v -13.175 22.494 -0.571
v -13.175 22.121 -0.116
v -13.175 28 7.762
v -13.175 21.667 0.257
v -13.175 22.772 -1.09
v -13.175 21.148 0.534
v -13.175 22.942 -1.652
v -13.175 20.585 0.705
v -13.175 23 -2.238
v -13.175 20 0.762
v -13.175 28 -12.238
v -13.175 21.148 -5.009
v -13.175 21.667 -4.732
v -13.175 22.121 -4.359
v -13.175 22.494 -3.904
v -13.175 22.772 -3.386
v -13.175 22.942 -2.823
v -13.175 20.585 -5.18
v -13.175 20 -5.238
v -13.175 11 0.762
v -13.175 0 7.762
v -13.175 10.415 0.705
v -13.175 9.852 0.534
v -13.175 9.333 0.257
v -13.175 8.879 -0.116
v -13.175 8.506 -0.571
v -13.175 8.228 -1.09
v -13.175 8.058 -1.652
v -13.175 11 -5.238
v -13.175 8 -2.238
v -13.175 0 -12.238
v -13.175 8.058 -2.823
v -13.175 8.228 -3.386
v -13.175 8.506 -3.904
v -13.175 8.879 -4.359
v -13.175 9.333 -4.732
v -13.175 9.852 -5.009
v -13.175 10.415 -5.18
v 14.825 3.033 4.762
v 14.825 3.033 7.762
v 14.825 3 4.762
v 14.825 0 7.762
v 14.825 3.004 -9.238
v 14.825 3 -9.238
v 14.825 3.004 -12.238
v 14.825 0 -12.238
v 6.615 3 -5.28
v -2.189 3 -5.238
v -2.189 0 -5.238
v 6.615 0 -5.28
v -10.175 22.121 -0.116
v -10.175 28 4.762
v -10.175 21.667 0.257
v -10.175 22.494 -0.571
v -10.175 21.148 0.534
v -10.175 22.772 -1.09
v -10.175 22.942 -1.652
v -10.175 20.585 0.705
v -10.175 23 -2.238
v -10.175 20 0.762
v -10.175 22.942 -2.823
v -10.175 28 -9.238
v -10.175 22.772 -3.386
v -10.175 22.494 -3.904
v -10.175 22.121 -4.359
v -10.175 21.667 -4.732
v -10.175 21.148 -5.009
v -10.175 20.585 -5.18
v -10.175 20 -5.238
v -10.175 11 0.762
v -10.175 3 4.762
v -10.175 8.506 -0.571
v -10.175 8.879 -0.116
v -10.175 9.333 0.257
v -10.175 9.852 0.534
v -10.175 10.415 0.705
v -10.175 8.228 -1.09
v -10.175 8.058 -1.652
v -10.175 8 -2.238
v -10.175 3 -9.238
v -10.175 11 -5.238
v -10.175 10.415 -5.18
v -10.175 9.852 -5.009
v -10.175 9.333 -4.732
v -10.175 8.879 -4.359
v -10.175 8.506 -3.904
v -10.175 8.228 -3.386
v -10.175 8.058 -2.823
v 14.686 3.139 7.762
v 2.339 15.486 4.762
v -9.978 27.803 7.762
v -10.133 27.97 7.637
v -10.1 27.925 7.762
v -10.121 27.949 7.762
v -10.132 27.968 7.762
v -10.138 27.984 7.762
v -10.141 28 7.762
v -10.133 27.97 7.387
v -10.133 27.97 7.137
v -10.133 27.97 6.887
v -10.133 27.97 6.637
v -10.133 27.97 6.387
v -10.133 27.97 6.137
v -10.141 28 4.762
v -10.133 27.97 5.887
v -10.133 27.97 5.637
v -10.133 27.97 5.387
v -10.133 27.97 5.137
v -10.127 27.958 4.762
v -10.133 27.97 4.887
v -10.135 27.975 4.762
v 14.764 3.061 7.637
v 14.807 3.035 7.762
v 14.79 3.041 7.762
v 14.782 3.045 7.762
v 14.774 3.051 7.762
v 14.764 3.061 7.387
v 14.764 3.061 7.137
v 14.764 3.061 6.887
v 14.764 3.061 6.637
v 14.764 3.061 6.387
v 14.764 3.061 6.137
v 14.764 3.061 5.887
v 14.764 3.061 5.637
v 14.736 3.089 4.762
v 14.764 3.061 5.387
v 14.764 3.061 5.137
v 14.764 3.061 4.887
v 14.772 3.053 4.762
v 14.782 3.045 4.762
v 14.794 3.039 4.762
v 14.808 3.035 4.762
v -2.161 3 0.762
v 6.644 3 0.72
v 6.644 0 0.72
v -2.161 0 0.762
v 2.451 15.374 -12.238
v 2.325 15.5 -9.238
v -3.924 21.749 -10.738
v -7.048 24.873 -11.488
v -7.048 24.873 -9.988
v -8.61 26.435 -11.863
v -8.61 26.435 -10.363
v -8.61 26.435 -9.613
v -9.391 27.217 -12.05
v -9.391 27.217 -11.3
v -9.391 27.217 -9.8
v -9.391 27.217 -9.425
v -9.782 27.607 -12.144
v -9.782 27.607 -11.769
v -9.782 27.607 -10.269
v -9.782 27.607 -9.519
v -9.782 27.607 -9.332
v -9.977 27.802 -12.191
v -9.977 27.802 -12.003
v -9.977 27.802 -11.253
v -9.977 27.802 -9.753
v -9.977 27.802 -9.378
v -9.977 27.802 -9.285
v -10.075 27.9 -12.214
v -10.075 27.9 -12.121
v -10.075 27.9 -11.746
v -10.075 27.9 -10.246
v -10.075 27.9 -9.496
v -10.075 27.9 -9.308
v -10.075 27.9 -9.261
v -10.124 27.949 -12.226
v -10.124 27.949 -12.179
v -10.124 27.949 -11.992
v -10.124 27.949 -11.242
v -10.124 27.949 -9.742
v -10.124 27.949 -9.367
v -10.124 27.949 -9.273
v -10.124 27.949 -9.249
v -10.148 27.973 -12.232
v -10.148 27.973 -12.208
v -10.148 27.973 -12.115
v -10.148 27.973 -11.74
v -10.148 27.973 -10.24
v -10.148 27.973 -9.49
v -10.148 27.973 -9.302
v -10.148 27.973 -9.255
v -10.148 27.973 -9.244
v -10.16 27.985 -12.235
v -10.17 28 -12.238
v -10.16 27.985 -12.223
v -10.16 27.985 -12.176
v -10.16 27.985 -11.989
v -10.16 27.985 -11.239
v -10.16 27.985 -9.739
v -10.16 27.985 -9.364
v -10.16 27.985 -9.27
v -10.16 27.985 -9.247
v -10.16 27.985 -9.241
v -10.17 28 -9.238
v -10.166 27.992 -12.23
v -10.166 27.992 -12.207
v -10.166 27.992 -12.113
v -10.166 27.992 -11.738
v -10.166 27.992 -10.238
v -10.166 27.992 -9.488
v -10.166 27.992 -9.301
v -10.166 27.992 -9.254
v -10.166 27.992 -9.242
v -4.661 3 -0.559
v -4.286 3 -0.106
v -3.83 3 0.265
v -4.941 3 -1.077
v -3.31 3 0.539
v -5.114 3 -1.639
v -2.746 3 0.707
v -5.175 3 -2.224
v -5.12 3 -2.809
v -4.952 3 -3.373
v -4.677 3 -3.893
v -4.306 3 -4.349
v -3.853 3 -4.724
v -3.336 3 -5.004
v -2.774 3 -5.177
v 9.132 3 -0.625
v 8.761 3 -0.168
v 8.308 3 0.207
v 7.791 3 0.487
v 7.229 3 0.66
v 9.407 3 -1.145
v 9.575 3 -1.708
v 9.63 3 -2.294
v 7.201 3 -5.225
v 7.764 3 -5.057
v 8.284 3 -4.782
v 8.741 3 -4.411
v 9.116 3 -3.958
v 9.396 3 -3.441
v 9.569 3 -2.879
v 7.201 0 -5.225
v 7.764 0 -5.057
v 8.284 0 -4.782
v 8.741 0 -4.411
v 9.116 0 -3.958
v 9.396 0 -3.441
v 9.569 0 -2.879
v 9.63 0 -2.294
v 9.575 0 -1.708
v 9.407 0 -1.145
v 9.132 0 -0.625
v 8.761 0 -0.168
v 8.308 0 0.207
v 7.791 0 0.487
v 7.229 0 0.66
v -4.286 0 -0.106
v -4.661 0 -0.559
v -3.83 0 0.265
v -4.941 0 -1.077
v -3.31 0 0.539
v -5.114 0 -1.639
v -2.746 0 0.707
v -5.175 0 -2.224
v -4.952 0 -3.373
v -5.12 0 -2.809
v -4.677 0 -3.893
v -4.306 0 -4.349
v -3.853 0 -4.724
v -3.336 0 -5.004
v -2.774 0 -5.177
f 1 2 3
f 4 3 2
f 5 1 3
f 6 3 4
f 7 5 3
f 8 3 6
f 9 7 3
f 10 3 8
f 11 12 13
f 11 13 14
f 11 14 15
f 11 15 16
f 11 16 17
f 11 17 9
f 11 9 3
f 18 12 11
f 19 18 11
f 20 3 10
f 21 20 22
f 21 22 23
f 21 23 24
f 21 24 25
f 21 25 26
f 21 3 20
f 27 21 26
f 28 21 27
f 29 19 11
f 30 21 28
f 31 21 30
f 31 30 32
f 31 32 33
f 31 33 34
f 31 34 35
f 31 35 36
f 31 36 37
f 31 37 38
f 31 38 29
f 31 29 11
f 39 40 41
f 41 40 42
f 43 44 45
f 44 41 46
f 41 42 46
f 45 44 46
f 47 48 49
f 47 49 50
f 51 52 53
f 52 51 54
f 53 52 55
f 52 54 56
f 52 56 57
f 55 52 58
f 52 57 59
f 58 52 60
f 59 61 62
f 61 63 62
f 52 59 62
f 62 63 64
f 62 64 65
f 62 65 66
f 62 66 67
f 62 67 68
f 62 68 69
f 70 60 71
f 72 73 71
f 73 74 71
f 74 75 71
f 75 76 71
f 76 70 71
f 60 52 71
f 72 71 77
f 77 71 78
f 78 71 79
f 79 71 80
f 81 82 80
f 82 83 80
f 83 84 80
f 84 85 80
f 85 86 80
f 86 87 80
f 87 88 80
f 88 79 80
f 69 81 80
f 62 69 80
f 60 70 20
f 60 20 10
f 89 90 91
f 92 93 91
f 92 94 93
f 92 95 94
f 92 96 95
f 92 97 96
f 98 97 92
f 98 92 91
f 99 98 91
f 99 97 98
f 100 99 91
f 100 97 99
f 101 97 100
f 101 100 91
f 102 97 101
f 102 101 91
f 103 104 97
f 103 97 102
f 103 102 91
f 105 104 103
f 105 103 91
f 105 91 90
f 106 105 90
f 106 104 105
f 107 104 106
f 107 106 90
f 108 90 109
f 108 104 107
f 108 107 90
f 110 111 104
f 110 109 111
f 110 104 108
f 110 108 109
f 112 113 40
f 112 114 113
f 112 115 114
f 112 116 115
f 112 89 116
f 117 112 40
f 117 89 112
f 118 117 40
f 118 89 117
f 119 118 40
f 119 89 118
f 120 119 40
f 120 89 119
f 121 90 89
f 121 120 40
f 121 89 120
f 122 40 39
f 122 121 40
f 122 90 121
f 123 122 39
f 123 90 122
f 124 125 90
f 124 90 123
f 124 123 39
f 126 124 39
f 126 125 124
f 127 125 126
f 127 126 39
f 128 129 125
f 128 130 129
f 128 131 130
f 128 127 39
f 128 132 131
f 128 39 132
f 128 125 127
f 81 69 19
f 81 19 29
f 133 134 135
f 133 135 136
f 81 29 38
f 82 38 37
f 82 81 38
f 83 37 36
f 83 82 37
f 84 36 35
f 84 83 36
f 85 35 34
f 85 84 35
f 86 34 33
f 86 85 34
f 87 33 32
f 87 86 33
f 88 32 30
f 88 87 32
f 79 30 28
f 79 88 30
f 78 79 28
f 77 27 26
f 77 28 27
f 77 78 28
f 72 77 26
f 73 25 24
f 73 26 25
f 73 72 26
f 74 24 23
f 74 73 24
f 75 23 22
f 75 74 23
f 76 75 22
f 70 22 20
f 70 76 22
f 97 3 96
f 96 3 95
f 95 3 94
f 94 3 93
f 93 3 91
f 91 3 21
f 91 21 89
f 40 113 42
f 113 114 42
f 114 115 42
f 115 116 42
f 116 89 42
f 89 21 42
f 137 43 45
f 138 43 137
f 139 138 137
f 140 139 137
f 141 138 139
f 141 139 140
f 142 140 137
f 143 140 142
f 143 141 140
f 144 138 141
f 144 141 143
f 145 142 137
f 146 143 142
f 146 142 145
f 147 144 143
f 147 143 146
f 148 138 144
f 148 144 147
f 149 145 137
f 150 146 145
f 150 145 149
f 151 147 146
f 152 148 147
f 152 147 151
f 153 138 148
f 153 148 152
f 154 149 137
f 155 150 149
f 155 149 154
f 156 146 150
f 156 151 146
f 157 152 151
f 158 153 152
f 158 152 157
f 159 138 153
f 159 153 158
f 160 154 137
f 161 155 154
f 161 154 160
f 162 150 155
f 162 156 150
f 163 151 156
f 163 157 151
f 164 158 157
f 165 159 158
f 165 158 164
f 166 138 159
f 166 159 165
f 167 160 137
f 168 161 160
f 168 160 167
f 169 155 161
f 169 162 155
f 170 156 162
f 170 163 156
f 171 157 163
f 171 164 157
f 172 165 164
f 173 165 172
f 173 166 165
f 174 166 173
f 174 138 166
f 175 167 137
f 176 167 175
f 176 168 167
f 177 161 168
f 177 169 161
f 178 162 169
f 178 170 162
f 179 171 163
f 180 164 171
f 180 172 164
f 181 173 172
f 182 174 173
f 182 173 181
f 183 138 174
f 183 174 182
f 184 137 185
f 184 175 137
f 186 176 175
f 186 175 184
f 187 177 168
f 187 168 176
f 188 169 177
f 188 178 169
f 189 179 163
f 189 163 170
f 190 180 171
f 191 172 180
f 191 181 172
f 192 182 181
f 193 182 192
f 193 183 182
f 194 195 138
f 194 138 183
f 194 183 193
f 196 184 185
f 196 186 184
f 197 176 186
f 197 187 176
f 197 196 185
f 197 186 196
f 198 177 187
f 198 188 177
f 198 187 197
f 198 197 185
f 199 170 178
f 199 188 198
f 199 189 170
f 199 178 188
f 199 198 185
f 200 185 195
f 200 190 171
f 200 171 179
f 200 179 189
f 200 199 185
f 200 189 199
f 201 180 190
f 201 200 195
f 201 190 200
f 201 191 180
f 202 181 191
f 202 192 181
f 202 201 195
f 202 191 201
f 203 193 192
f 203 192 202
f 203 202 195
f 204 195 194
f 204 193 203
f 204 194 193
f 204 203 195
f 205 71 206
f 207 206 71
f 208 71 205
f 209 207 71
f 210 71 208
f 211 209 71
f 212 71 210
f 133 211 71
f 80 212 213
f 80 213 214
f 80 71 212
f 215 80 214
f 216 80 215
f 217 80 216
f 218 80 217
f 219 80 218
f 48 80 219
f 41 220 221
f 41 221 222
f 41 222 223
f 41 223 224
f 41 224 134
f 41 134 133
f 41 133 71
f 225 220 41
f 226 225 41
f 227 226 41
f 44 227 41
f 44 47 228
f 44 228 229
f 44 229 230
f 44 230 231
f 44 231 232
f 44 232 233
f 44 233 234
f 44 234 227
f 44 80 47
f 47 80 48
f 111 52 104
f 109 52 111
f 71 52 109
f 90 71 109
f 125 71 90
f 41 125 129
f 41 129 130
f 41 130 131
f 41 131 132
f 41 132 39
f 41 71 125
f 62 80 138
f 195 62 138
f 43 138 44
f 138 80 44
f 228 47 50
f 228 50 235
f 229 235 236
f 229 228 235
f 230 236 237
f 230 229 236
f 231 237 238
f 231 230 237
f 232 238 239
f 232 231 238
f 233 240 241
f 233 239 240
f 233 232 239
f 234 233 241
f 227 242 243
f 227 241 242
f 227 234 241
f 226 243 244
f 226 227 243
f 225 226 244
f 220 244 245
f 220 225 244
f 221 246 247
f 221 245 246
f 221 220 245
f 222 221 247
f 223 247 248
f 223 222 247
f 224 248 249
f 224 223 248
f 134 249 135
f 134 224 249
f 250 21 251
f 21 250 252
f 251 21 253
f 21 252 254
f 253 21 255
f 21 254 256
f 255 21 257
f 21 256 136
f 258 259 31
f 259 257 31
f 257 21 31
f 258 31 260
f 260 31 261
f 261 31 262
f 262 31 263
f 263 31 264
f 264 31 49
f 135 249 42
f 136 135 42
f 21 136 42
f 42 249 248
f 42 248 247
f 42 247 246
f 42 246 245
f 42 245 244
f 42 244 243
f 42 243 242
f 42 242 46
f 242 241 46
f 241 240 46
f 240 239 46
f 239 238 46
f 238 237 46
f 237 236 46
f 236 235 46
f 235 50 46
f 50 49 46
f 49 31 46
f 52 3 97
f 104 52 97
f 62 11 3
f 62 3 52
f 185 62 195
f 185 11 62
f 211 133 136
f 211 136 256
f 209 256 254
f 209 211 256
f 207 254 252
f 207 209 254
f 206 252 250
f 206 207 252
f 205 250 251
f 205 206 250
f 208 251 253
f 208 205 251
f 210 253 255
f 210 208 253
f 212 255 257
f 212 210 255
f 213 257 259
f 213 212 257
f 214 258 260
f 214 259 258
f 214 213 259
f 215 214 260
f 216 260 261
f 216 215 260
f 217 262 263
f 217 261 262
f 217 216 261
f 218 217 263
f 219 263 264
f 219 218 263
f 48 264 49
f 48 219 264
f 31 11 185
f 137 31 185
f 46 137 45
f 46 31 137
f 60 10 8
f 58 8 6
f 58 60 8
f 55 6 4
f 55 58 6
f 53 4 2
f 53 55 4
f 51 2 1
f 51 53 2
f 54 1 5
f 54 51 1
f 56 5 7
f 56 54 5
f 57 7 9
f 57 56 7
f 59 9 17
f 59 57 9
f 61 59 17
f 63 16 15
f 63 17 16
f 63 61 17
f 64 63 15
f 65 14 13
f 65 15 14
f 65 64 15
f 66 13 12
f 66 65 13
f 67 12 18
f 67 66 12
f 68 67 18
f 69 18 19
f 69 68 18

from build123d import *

# Parameters (mm, degrees)
SKETCH1_W           = 28
SKETCH1_H           = 20
BOSS_EXTRUDE1_DEPTH = 3
SKETCH2_W           = 3
SKETCH2_H           = 20
BOSS_EXTRUDE2_DEPTH = 25
SKETCH3_W           = 25
SKETCH3_H           = 3
BOSS_EXTRUDE3_DEPTH = 25
CUT_EXTRUDE1_DEPTH  = 25
CUT_EXTRUDE2_DEPTH  = 25
CUT_EXTRUDE3_DEPTH  = 25
CUT_EXTRUDE4_DEPTH  = 25


with BuildPart() as part:
    # Sketch1 → Boss-Extrude1 (new body)
    with BuildSketch(Plane(origin=(0, 0, 0), x_dir=(1, 0, 0), z_dir=(0, 1, 0))):
        with Locations((0.825174825, 2.237762238)):
            Rectangle(SKETCH1_W, SKETCH1_H)
    extrude(amount=BOSS_EXTRUDE1_DEPTH)

    # Sketch2 → Boss-Extrude2 (add)
    with BuildSketch(Plane(origin=(0, 3, 0), x_dir=(1, 0, 0), z_dir=(0, 1, 0))):
        with Locations((-11.674825175, 2.237762238)):
            Rectangle(SKETCH2_W, SKETCH2_H)
    extrude(amount=BOSS_EXTRUDE2_DEPTH)

    # Sketch3 → Boss-Extrude3 (add)
    with BuildSketch(Plane(origin=(0, 3, 0), x_dir=(1, 0, 0), z_dir=(0, 1, 0))):
        with Locations((2.325174825, -6.262237762)):
            Rectangle(SKETCH3_W, SKETCH3_H)
        with Locations((2.325174825, 10.737762238)):
            Rectangle(SKETCH3_W, SKETCH3_H)
    extrude(amount=BOSS_EXTRUDE3_DEPTH)

    # Sketch4 → Cut-Extrude1 (cut)
    with BuildSketch(Plane.XY.offset(-9.237762238)):
        with BuildLine():
            add(Edge.make_bspline(
                [(14.816368242, 3.008806583), (6.487903216, 11.337271609), (-1.840561809, 19.665736635), (-10.169026835, 27.99420166), (-10.16964342, 27.994818245), (-10.170781245, 27.99595607), (-10.170656704, 27.998996051), (-10.170343396, 28)],
                knots=[0, 0, 0, 0, 0.344046384, 0.344046384, 0.344046384, 0.344071855, 0.344093387, 0.344093387, 0.344093387, 0.344093387], degree=3))
            add(Edge.make_bspline(
                [(14.825174825, 3.004378162), (14.823896916, 3.004464678), (14.819965163, 3.005209662), (14.817823619, 3.007351206), (14.816368242, 3.008806583)],
                knots=[0.999911533, 0.999911533, 0.999911533, 0.999911533, 0.999939879, 1, 1, 1, 1], degree=3))
            Line((14.825174825, 3.004378162), (14.825174825, 28))
            Line((14.825174825, 28), (-10.170343396, 28))
        make_face()
    extrude(amount=-CUT_EXTRUDE1_DEPTH, mode=Mode.SUBTRACT)

    # Sketch5 → Cut-Extrude2 (cut)
    with BuildSketch(Plane(origin=(0, 0, 4.762237762), x_dir=(-1, 0, 0), z_dir=(0, 0, -1))):
        with BuildLine():
            add(Edge.make_bspline(
                [(-35.067252589, 33.961212886), (-29.391038068, 36.178470487), (-23.714823548, 38.395728089), (-18.038609027, 40.612985691), (-17.963791349, 40.642211165), (-17.814155994, 40.700662115), (-17.559065615, 40.718177611), (-17.399544187, 40.699199542), (-17.319783474, 40.689710508), (-10.209359532, 39.843792085), (-3.09893559, 38.997873662), (4.011488351, 38.151955239), (4.046454663, 38.14779534), (4.116387287, 38.139475541), (4.223224946, 38.0698289), (4.25905817, 38.009200763), (4.276974782, 37.978886695), (6.22420547, 34.684263552), (8.171436157, 31.389640408), (10.118666845, 28.095017265), (10.128528722, 28.078331431), (10.148252475, 28.044959763), (10.137896266, 27.963071091), (10.11048555, 27.935660375), (10.096780192, 27.921955017), (1.809823102, 19.634997927), (-6.477133988, 11.348040838), (-14.764091077, 3.061083748), (-14.773689462, 3.051485363), (-14.792886232, 3.032288593), (-14.857463418, 3.032288593), (-14.876660188, 3.051485363), (-14.886258573, 3.061083748), (-16.63085756, 4.805682735), (-18.375456547, 6.550281721), (-20.120055533, 8.294880708), (-20.229166807, 8.403991982), (-20.447389354, 8.622214529), (-20.734044746, 8.995724629), (-20.888397332, 9.262965044), (-20.965573625, 9.396585251), (-25.677007414, 17.553789146), (-30.388441203, 25.71099304), (-35.099874992, 33.868196935), (-35.105352774, 33.877680966), (-35.116308338, 33.896649028), (-35.097857424, 33.949257946), (-35.077454201, 33.957227906), (-35.067252589, 33.961212886)],
                knots=[0, 0, 0, 0, 0.146383908, 0.146383908, 0.146383908, 0.148313382, 0.150242855, 0.152172328, 0.152172328, 0.152172328, 0.324178973, 0.324178973, 0.324178973, 0.325024835, 0.325870697, 0.326716559, 0.326716559, 0.326716559, 0.418647366, 0.418647366, 0.418647366, 0.419112956, 0.419578546, 0.420044135, 0.420044135, 0.420044135, 0.701563293, 0.701563293, 0.701563293, 0.701889363, 0.702215434, 0.702541504, 0.702541504, 0.702541504, 0.761807895, 0.761807895, 0.761807895, 0.765514552, 0.76922121, 0.772927868, 0.772927868, 0.772927868, 0.999210732, 0.999210732, 0.999210732, 0.999473821, 0.999736911, 1, 1, 1, 1], degree=3))
        make_face()
    extrude(amount=-CUT_EXTRUDE2_DEPTH, mode=Mode.SUBTRACT)

    # Sketch6 → Cut-Extrude3 (cut)
    with BuildSketch(Plane(origin=(-10.174825175, 0, 0), x_dir=(0, 0, -1), z_dir=(1, 0, 0))):
        with BuildLine():
            Line((-0.762237762, 11), (-0.762237762, 20))
            ThreePointArc((-0.762237762, 20), (2.237762238, 23), (5.237762238, 20))
            Line((5.237762238, 20), (5.237762238, 11))
            ThreePointArc((5.237762238, 11), (2.237762238, 8), (-0.762237762, 11))
        make_face()
    extrude(amount=-CUT_EXTRUDE3_DEPTH, mode=Mode.SUBTRACT)

    # Sketch7 → Cut-Extrude4 (cut)
    with BuildSketch(Plane(origin=(0, 3, 0), x_dir=(1, 0, 0), z_dir=(0, 1, 0))):
        with BuildLine():
            Line((6.643802614, -0.720378412), (-2.16057373, -0.762203911))
            ThreePointArc((-2.16057373, -0.762203911), (-5.174791324, 2.223510793), (-2.189076619, 5.237728387))
            Line((-2.189076619, 5.237728387), (6.615299725, 5.279553886))
            ThreePointArc((6.615299725, 5.279553886), (9.629517318, 2.293839181), (6.643802614, -0.720378412))
        make_face()
    extrude(amount=-CUT_EXTRUDE4_DEPTH, mode=Mode.SUBTRACT)


solid = part.part
